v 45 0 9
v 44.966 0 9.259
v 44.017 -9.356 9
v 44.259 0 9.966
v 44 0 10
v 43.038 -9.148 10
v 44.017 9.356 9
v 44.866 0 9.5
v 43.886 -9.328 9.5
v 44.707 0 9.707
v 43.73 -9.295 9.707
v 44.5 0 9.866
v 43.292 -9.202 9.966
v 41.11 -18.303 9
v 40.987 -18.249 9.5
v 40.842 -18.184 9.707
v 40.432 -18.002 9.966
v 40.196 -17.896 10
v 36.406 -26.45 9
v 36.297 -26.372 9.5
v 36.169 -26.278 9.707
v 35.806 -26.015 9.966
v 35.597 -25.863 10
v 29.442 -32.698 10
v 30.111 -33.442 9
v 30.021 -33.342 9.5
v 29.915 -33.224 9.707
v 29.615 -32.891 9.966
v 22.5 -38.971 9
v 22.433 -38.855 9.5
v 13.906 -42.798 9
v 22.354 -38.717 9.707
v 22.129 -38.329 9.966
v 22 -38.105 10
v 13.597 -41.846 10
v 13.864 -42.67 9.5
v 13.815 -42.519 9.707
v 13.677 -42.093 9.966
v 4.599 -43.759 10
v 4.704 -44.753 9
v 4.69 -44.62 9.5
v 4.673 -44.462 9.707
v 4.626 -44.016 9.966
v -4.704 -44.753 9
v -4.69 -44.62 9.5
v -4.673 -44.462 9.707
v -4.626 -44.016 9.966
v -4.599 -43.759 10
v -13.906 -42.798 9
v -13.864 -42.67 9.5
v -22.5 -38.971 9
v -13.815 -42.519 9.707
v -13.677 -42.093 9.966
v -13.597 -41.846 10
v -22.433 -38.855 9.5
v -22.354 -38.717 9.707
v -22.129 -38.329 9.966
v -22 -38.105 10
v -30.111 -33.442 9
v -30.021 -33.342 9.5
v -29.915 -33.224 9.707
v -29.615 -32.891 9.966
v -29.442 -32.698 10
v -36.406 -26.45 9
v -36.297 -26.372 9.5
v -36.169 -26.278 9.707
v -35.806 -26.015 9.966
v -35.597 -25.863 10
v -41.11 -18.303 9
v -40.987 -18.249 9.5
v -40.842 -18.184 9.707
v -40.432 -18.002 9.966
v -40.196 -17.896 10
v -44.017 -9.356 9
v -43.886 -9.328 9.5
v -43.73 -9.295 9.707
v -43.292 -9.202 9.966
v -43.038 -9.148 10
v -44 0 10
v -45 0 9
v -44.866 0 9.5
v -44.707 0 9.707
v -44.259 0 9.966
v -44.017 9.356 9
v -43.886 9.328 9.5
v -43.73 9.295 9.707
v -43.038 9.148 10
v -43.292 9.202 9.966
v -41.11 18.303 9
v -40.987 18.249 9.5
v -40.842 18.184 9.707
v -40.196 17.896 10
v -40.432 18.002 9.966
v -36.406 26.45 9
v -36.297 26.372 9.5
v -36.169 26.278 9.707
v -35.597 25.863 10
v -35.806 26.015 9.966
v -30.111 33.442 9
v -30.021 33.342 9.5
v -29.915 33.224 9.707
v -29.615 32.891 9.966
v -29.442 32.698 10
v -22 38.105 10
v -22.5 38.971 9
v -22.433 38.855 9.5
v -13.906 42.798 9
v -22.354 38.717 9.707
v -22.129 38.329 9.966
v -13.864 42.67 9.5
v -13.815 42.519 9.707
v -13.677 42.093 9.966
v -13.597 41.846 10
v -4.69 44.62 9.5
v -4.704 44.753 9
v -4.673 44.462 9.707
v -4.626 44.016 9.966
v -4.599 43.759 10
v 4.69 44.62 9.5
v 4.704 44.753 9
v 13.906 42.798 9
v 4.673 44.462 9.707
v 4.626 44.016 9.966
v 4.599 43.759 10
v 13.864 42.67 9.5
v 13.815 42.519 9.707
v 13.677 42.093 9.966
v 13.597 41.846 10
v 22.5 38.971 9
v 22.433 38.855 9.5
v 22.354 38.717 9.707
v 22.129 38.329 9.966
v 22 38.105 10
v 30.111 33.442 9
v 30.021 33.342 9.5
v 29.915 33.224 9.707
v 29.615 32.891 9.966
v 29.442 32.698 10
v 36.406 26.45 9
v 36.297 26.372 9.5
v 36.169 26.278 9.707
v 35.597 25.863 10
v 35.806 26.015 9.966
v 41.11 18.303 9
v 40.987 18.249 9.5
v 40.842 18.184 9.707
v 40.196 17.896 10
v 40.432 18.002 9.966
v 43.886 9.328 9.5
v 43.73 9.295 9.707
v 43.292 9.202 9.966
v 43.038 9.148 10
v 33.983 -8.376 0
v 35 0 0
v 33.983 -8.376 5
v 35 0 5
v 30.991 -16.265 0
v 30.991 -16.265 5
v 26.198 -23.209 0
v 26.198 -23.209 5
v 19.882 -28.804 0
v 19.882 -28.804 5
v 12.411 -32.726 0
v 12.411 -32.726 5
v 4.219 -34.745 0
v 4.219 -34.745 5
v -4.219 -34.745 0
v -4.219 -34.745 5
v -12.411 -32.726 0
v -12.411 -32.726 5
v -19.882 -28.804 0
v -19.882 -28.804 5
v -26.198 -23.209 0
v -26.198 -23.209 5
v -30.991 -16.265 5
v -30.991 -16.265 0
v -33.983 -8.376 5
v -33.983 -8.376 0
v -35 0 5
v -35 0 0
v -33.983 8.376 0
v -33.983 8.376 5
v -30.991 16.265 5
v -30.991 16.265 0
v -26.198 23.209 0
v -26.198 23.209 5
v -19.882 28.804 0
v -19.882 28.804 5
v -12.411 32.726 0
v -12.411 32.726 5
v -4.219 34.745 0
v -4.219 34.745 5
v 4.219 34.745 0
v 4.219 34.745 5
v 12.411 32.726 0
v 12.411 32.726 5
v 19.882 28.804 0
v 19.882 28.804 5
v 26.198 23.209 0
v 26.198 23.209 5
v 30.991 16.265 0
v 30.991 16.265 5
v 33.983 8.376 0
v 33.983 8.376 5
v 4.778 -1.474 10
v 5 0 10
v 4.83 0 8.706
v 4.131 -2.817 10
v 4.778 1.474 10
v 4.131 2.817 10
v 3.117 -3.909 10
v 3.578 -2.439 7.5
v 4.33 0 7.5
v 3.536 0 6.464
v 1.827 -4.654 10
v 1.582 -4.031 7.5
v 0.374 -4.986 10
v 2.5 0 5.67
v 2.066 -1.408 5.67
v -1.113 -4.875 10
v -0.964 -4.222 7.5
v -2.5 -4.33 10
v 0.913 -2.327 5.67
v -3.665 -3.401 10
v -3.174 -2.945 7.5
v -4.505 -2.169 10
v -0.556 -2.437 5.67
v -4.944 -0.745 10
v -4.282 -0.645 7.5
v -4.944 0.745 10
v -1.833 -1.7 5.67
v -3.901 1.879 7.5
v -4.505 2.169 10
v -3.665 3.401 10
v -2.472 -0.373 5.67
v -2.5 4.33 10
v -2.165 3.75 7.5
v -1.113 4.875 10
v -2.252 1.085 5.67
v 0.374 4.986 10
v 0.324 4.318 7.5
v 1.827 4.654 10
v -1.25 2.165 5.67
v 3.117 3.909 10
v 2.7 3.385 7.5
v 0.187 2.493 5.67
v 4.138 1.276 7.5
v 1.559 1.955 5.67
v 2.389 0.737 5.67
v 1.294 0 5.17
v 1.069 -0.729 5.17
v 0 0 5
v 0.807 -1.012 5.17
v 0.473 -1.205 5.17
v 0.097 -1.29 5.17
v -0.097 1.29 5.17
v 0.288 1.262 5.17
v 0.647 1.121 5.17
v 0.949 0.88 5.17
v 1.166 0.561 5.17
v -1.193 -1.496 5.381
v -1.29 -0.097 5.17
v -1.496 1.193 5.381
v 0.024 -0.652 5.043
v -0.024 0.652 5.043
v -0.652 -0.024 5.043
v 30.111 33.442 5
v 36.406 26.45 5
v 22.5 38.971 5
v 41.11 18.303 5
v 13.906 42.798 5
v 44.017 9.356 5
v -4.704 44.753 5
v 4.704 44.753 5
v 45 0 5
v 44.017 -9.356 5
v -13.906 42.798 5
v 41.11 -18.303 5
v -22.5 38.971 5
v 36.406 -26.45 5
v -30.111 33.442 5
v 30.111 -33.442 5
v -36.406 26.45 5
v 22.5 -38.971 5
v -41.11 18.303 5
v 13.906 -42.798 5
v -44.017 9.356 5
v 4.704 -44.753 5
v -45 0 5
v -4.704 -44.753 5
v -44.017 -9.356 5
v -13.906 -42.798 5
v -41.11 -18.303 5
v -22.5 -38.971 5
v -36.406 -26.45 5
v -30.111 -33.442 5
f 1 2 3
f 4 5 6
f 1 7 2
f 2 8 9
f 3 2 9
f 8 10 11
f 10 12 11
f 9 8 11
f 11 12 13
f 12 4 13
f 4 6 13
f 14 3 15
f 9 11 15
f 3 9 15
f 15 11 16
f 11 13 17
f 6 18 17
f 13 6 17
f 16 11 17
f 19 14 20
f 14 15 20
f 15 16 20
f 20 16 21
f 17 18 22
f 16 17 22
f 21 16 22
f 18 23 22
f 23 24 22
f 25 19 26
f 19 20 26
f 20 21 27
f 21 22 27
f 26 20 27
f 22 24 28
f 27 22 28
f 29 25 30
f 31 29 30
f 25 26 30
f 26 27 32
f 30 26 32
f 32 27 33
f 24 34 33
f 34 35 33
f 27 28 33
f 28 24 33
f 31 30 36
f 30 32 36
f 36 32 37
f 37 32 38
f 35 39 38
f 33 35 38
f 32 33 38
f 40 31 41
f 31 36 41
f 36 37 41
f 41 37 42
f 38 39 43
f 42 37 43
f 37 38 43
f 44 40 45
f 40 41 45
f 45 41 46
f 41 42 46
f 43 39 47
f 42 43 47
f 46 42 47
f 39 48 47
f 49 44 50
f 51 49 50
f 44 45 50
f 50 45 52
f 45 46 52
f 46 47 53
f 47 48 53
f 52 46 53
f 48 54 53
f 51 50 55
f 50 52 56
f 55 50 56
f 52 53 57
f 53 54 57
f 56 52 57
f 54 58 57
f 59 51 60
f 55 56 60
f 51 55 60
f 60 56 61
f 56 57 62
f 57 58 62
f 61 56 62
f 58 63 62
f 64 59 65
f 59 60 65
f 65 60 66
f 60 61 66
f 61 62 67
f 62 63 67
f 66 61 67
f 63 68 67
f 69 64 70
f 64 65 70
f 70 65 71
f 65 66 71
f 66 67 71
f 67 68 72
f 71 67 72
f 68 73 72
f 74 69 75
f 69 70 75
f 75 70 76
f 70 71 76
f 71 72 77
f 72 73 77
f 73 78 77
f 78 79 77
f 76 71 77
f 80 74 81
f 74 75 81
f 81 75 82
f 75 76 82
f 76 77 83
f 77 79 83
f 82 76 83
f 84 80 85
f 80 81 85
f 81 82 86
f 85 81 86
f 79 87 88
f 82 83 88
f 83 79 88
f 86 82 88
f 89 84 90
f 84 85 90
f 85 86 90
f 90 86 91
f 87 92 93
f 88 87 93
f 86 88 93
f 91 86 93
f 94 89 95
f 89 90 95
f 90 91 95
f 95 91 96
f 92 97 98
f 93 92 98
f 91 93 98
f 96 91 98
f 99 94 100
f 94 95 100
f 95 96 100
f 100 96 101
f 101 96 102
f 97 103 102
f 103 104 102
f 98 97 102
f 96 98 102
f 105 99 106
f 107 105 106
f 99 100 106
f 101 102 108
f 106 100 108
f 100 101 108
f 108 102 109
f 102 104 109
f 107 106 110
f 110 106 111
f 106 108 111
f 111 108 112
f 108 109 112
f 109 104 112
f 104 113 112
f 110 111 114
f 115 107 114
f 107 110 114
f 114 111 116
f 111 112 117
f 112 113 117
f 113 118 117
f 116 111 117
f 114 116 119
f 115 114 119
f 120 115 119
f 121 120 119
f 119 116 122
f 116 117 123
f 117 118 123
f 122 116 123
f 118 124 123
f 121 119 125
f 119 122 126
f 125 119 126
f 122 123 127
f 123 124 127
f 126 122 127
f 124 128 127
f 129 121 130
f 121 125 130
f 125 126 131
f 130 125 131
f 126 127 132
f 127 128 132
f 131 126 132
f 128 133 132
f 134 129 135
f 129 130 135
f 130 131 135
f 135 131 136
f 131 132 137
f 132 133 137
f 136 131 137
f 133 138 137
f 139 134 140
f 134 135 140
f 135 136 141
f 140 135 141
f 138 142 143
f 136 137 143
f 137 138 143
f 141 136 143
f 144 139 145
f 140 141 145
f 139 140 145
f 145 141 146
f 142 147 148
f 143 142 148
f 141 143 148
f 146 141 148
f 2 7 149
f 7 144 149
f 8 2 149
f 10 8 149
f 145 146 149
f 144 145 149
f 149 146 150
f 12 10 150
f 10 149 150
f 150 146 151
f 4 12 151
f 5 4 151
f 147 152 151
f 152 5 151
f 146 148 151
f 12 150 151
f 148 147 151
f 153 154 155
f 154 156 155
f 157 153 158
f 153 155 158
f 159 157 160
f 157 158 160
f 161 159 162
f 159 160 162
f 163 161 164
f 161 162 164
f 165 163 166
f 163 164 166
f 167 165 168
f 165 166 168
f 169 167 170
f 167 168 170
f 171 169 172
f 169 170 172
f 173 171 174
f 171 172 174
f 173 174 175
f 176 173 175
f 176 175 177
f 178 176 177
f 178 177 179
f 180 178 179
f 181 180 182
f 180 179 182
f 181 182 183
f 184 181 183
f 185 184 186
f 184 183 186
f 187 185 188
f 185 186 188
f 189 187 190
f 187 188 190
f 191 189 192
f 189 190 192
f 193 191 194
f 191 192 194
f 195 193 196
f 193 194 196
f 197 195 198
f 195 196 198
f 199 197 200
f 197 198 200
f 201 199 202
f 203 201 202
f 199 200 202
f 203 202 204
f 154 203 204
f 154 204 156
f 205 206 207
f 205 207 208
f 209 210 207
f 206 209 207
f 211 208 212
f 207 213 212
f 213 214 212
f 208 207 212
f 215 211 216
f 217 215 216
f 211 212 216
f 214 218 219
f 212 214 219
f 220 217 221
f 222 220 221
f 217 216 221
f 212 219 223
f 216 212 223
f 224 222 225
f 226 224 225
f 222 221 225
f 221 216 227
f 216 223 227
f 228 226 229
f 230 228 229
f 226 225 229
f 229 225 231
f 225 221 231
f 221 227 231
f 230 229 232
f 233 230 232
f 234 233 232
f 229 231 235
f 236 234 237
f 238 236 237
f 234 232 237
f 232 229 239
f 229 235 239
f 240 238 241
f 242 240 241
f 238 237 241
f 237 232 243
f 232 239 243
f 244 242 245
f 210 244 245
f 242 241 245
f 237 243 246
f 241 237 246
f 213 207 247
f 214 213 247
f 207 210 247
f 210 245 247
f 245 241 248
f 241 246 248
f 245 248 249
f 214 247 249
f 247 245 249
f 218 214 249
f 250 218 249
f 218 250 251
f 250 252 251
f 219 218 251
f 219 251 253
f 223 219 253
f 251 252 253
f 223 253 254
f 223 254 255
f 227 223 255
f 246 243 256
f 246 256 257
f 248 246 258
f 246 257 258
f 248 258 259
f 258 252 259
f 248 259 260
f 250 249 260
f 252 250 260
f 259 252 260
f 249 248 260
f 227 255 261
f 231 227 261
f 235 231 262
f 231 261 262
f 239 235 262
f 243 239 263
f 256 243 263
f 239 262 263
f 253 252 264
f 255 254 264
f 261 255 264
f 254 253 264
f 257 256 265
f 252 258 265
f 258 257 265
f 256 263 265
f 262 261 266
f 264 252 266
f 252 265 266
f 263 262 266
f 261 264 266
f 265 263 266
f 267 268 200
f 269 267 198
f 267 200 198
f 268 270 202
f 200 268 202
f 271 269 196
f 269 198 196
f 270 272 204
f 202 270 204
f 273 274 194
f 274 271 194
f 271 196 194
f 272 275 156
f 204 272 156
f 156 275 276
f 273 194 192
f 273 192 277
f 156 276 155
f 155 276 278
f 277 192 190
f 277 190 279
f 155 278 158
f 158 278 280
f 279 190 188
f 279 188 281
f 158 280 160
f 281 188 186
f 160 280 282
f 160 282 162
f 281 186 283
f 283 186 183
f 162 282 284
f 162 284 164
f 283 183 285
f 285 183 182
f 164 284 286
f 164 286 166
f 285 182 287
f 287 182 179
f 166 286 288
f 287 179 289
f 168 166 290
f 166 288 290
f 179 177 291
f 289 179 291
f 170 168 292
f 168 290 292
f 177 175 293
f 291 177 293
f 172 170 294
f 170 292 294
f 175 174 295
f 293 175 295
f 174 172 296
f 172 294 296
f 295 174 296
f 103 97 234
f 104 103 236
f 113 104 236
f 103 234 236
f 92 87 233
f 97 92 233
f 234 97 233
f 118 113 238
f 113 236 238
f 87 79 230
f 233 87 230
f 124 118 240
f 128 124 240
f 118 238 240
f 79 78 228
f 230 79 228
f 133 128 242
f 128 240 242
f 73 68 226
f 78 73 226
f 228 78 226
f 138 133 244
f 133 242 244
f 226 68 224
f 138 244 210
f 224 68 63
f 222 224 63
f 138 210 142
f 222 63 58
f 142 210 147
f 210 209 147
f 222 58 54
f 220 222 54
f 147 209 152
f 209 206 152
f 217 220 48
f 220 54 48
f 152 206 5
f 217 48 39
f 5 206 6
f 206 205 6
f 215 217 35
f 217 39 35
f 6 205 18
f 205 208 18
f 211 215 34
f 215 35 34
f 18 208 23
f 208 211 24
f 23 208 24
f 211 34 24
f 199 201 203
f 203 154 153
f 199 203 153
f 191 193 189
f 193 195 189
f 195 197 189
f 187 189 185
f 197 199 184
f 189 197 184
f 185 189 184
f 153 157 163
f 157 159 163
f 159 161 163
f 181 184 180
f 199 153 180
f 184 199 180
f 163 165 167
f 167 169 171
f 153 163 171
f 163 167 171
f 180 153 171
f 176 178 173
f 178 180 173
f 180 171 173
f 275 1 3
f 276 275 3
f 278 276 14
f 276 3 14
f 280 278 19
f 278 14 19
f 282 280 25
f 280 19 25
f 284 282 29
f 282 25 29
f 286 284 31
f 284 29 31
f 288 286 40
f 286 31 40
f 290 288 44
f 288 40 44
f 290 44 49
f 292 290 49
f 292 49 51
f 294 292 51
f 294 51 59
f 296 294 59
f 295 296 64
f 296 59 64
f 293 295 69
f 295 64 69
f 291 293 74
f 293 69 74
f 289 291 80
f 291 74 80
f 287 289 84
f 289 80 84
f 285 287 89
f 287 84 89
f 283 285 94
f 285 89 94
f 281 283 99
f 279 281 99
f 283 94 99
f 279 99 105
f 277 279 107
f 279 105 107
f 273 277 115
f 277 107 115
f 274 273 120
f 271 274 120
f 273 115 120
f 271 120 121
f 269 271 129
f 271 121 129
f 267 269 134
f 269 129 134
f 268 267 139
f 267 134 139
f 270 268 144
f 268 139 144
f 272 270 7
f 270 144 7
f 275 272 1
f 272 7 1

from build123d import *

# Parameters (mm, degrees)
F2_R = 1


with BuildPart() as f1:
    # F0 (on Front) → F1 (revolve)
    with BuildSketch(Plane.XZ):
        with BuildLine():
            Line((0, 5), (0, 0))
            Line((0, 0), (35, 0))
            Line((35, 0), (35, 5))
            Line((35, 5), (45, 5))
            Line((45, 5), (45, 10))
            Line((45, 10), (5, 10))
            ThreePointArc((5, 10), (3.535534, 6.464466), (0, 5))
        make_face()
    revolve(axis=Axis((0, 0, 5), (0, 0, -1)))

    # F2
    f2_edges = [f1.edges().sort_by_distance(p)[0] for p in [
        (-45, 0, 10),
    ]]
    fillet(f2_edges, radius=F2_R)


solid = f1.part
